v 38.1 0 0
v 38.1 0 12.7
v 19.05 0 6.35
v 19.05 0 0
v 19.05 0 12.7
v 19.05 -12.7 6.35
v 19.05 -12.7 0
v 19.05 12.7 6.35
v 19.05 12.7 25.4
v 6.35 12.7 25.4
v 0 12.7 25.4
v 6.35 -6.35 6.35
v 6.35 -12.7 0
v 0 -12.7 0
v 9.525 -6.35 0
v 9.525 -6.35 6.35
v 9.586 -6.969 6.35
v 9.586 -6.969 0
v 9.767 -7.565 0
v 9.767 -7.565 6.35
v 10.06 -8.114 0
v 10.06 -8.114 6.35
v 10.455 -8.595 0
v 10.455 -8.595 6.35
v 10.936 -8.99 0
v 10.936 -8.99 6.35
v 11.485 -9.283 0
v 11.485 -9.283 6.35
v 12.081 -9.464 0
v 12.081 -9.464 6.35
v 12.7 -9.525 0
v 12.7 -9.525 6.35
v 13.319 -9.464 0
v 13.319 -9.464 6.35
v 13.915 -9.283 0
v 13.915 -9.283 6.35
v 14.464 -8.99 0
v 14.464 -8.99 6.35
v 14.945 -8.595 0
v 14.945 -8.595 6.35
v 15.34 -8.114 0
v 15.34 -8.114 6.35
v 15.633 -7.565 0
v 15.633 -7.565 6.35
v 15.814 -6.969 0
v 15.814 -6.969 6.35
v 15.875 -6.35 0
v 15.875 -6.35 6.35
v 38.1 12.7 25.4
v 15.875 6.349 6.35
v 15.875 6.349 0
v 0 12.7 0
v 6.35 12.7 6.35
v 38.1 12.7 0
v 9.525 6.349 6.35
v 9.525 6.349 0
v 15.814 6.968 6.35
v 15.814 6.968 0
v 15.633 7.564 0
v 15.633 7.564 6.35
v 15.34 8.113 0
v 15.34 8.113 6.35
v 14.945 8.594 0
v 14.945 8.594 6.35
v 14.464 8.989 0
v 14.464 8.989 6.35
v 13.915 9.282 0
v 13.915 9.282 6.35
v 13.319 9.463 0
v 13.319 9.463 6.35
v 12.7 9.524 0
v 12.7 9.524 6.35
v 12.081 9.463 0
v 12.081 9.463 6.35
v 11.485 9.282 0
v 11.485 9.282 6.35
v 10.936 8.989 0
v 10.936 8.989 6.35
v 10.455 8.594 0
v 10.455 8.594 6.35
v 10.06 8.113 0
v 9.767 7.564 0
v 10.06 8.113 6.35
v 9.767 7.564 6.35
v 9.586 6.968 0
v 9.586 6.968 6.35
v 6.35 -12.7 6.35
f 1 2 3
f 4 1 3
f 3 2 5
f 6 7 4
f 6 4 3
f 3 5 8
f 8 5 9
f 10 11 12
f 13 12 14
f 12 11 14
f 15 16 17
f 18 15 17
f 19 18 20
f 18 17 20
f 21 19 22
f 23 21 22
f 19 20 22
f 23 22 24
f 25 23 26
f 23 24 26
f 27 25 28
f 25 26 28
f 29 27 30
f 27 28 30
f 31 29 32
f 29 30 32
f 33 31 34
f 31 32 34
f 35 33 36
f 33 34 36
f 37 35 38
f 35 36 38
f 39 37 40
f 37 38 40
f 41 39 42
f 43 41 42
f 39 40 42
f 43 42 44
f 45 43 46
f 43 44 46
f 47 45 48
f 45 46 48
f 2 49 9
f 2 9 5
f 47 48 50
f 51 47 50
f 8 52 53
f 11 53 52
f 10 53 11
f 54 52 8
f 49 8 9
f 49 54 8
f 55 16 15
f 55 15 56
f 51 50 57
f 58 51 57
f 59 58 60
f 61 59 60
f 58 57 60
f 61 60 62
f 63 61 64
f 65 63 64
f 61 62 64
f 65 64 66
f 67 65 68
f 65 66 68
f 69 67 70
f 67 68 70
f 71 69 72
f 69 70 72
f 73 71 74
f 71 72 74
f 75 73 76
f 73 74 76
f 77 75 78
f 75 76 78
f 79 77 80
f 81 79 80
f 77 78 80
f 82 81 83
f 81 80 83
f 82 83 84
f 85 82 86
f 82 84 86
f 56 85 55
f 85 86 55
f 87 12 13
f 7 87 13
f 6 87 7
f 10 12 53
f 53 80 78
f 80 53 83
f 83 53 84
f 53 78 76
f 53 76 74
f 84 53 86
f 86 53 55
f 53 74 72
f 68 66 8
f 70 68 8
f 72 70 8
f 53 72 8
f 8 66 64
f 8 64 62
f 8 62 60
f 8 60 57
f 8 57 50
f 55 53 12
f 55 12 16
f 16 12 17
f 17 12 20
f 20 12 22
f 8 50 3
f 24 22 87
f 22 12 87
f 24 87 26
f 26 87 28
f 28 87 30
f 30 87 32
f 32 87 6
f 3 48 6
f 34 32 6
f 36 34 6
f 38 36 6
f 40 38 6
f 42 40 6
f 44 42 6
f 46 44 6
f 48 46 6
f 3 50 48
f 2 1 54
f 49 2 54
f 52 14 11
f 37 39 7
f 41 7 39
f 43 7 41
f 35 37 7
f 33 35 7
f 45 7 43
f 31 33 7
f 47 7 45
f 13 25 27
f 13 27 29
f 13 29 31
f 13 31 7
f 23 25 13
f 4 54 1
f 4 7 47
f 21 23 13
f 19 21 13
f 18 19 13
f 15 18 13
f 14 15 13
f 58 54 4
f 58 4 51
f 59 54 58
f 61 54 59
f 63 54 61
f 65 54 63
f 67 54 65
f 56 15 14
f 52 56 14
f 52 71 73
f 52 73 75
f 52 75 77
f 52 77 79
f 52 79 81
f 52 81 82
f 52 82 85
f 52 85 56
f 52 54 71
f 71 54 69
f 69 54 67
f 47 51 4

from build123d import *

# Parameters (mm, degrees)
F0_W      = 6.35
F0_H      = 25.4
F1_DEPTH  = 12.7
F2_W      = 12.7
F2_H      = 6.35
F3_DEPTH  = 25.4
F4_W      = 19.05
F4_H      = 12.7
F5_DEPTH  = 12.7
F7_DEPTH  = 19.05
F9_DEPTH  = 6.35
F10_W     = 6.35
F10_H     = 12.698938
F11_DEPTH = 25.4


with BuildPart() as f1:
    # F0 (on Front) → F1 (new body, symmetric)
    with BuildSketch(Plane.XZ):
        with Locations((3.175, 12.7)):
            Rectangle(F0_W, F0_H)
    extrude(amount=F1_DEPTH, both=True)

    # F2 (on face) → F3 (join)
    with BuildSketch(Plane.XZ.offset(12.7)):
        with Locations((12.7, 3.175)):
            Rectangle(F2_W, F2_H)
    extrude(amount=-F3_DEPTH)

    # F4 (on face) → F5 (join)
    with BuildSketch(Plane(origin=(0, 12.7, 0), x_dir=(-1, 0, 0), z_dir=(0, 1, 0))):
        with Locations((-28.575, 6.35)):
            Rectangle(F4_W, F4_H)
    extrude(amount=-F5_DEPTH)

    # F6 (on face) → F7 (join)
    with BuildSketch(Plane.YZ.offset(38.1)):
        Polygon((0, 12.7), (12.7, 12.7), (12.7, 25.4), align=None)
    extrude(amount=-F7_DEPTH)

    # F8 (on face) → F9 (cut)
    with BuildSketch(Plane(origin=(0, 0, 0), x_dir=(0, -1, 0), z_dir=(-1, 0, 0))):
        Polygon((-12.7, 25.4), (12.7, 0), (12.7, 25.4), align=None)
    extrude(amount=-F9_DEPTH, mode=Mode.SUBTRACT)

    # F10 (on face) → F11 (cut)
    with BuildSketch(Plane.XY.offset(6.35)):
        with Locations((12.7, -0.000531)):
            Rectangle(F10_W, F10_H)
        with BuildLine():
            ThreePointArc((15.875, 6.348938), (12.7, 9.523938), (9.525, 6.348938))
            Line((9.525, 6.348938), (15.875, 6.348938))
        make_face()
        with BuildLine():
            Line((15.875, -6.35), (9.525, -6.35))
            ThreePointArc((9.525, -6.35), (12.7, -9.525), (15.875, -6.35))
        make_face()
    extrude(amount=-F11_DEPTH, mode=Mode.SUBTRACT)


solid = f1.part
